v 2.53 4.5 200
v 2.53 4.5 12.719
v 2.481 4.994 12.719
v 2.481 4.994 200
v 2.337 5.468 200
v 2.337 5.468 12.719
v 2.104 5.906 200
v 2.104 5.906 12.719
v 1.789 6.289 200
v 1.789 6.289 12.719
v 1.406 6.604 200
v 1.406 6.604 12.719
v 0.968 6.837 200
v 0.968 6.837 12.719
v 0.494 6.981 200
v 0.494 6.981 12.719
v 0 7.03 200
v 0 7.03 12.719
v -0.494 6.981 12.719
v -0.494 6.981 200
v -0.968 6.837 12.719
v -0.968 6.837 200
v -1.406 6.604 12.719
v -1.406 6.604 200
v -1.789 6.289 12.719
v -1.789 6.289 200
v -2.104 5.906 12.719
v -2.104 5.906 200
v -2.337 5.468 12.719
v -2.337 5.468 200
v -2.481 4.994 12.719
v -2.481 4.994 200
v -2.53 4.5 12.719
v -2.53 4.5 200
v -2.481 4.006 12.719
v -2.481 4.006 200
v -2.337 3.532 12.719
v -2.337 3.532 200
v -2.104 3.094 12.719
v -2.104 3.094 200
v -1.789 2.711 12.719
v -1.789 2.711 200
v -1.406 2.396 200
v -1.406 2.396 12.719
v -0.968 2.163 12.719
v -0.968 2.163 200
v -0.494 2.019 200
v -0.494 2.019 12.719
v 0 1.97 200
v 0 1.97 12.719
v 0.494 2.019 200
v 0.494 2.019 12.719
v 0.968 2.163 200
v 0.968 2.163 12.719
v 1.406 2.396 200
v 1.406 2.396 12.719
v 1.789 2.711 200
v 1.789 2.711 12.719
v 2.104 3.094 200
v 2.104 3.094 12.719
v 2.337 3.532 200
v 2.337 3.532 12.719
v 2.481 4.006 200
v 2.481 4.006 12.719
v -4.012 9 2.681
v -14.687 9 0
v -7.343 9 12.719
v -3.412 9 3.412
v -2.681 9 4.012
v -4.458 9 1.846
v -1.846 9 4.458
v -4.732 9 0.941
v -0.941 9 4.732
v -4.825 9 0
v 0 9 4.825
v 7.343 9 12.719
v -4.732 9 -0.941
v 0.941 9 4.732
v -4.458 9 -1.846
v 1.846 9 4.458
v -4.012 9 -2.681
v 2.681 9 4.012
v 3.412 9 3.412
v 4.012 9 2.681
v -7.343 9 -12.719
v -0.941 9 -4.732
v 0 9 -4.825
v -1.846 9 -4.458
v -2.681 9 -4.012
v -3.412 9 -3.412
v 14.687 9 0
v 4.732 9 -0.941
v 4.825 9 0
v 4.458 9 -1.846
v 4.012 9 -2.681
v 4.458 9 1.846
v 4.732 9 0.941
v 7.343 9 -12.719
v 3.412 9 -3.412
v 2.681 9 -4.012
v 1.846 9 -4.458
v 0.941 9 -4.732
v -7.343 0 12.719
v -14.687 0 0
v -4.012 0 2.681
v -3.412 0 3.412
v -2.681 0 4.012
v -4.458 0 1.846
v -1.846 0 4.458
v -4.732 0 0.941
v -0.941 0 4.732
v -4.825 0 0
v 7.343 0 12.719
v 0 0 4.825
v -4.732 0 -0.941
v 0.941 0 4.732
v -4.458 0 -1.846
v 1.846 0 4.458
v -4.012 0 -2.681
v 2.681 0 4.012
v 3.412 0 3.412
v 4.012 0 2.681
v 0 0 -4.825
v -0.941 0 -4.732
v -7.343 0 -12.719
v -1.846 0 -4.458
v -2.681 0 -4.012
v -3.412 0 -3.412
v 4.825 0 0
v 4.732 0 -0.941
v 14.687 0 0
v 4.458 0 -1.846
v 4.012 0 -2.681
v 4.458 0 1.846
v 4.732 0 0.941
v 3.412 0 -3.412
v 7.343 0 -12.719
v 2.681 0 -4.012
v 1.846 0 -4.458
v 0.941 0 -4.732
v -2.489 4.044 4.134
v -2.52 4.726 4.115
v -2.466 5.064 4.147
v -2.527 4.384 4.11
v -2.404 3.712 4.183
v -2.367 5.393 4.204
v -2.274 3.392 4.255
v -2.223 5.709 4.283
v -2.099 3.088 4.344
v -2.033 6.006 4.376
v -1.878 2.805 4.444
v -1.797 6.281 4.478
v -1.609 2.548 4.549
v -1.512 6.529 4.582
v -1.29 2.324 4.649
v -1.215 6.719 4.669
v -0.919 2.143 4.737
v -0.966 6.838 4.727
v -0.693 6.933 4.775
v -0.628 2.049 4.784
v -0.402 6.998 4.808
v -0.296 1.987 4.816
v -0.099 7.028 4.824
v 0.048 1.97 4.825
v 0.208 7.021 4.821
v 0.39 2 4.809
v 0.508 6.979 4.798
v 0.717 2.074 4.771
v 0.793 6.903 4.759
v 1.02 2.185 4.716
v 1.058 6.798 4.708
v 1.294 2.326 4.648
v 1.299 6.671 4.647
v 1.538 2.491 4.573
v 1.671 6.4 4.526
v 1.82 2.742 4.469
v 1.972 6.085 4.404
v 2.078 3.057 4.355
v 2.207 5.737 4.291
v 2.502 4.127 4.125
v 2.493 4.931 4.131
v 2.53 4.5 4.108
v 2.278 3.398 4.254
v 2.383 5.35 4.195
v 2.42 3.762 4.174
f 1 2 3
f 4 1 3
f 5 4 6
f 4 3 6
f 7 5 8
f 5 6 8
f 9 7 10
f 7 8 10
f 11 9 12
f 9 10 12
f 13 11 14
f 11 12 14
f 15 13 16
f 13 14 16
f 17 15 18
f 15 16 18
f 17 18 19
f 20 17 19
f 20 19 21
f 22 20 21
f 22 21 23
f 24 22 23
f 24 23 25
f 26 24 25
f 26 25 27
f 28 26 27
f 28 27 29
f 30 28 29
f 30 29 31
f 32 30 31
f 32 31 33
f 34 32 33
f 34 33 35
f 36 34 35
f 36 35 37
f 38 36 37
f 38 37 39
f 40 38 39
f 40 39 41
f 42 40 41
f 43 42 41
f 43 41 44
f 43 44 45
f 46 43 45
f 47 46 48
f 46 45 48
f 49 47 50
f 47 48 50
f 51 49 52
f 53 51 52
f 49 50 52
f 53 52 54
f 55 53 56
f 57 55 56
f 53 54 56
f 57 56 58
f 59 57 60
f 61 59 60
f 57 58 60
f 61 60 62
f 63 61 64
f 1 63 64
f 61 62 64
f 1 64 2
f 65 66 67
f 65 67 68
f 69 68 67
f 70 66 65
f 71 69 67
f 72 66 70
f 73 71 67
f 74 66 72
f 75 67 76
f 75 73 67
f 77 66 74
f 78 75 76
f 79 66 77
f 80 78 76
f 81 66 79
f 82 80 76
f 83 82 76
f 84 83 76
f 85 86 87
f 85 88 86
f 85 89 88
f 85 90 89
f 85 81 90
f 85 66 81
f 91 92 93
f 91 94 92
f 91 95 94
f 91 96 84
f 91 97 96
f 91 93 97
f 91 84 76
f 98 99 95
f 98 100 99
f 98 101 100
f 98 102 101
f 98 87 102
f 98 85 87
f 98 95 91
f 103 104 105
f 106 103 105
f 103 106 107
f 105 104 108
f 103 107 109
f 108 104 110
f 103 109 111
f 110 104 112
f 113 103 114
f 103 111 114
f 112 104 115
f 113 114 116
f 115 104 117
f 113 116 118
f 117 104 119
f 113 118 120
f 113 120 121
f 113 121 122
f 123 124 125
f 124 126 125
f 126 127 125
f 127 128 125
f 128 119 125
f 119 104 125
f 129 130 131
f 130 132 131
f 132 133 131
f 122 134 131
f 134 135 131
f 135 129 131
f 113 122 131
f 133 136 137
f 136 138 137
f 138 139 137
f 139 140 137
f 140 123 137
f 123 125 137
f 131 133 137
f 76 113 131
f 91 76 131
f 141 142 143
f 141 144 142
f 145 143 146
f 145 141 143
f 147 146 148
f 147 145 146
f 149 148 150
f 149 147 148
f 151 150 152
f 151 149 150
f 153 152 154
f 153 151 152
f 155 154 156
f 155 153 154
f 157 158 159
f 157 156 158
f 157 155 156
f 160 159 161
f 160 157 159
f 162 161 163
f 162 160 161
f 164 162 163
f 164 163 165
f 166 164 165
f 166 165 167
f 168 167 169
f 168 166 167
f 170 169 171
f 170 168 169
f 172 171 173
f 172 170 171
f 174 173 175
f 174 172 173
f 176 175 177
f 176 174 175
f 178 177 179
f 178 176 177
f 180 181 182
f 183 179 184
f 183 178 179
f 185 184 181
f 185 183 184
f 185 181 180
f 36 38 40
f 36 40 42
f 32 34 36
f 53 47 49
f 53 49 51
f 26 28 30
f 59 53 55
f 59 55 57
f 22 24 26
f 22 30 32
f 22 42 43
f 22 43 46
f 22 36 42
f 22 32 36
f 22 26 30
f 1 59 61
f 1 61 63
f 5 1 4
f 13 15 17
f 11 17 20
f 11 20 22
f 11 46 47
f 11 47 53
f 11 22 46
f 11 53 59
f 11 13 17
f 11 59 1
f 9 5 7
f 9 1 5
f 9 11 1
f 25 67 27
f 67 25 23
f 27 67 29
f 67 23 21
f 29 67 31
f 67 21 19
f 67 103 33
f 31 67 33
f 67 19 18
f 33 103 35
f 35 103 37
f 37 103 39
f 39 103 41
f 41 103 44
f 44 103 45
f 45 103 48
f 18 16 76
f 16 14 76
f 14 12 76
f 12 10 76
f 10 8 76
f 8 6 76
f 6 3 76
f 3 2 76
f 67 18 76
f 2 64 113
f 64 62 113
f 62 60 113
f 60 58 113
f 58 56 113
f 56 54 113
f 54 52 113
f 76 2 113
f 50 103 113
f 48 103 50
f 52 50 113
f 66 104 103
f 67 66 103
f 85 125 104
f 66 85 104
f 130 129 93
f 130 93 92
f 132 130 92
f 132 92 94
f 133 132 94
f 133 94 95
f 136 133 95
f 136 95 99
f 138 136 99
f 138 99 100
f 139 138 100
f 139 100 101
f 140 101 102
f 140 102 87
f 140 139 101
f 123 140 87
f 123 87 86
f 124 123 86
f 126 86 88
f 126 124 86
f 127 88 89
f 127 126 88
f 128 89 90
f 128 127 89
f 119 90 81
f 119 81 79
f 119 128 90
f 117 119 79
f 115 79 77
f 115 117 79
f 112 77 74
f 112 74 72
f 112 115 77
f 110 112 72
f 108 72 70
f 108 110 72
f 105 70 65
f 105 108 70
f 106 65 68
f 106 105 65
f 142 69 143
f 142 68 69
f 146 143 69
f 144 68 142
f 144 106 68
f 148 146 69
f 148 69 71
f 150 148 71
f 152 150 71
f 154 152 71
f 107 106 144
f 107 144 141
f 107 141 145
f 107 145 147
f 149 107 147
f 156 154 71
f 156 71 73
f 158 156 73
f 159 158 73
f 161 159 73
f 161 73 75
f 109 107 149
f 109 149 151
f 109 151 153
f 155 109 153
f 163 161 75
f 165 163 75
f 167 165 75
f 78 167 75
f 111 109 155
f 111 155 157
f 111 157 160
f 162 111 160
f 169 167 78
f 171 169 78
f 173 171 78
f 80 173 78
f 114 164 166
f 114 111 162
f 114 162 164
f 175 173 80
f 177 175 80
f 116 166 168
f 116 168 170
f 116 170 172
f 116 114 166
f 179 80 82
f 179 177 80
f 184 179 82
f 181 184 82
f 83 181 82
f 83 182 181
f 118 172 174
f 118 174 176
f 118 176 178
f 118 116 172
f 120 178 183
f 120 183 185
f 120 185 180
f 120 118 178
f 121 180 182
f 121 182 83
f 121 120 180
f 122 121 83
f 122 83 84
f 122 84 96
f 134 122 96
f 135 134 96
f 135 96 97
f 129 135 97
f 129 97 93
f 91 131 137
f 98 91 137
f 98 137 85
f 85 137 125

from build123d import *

# Parameters (mm, degrees)
CROQUIS1_R                 = 4.825
SALIENTE_EXTRUIR1_DEPTH    = 9
CROQUIS2_R                 = 2.53
SALIENTE_EXTRUIR2_DEPTH    = 200
CROQUIS3_R                 = 4.825
CORTAR_EXTRUIR1_DEPTH      = 29
CORTAR_EXTRUIR1_DEPTH_BACK = 67


with BuildPart() as part:
    # Croquis1 → Saliente-Extruir1 (new body)
    with BuildSketch(Plane(origin=(0, 0, 0), x_dir=(1, 0, 0), z_dir=(0, 1, 0))):
        Polygon((14.68670308, 0), (7.34335154, 12.719057965), (-7.34335154, 12.719057965), (-14.68670308, 0), (-7.34335154, -12.719057965), (7.34335154, -12.719057965), align=None)
        Circle(CROQUIS1_R, mode=Mode.SUBTRACT)
    extrude(amount=SALIENTE_EXTRUIR1_DEPTH)

    # Croquis2 → Saliente-Extruir2 (add)
    with BuildSketch(Plane.XY):
        with Locations((0, 4.5)):
            Circle(CROQUIS2_R)
    extrude(amount=SALIENTE_EXTRUIR2_DEPTH)

    # Croquis3 → Cortar-Extruir1 (cut, two sides)
    with BuildSketch(Plane(origin=(0, 0, 0), x_dir=(1, 0, 0), z_dir=(0, 1, 0))) as cortar_extruir1_sk:
        Circle(CROQUIS3_R)
    extrude(amount=CORTAR_EXTRUIR1_DEPTH, mode=Mode.SUBTRACT)
    extrude(cortar_extruir1_sk.sketch, amount=-CORTAR_EXTRUIR1_DEPTH_BACK, mode=Mode.SUBTRACT)


solid = part.part
